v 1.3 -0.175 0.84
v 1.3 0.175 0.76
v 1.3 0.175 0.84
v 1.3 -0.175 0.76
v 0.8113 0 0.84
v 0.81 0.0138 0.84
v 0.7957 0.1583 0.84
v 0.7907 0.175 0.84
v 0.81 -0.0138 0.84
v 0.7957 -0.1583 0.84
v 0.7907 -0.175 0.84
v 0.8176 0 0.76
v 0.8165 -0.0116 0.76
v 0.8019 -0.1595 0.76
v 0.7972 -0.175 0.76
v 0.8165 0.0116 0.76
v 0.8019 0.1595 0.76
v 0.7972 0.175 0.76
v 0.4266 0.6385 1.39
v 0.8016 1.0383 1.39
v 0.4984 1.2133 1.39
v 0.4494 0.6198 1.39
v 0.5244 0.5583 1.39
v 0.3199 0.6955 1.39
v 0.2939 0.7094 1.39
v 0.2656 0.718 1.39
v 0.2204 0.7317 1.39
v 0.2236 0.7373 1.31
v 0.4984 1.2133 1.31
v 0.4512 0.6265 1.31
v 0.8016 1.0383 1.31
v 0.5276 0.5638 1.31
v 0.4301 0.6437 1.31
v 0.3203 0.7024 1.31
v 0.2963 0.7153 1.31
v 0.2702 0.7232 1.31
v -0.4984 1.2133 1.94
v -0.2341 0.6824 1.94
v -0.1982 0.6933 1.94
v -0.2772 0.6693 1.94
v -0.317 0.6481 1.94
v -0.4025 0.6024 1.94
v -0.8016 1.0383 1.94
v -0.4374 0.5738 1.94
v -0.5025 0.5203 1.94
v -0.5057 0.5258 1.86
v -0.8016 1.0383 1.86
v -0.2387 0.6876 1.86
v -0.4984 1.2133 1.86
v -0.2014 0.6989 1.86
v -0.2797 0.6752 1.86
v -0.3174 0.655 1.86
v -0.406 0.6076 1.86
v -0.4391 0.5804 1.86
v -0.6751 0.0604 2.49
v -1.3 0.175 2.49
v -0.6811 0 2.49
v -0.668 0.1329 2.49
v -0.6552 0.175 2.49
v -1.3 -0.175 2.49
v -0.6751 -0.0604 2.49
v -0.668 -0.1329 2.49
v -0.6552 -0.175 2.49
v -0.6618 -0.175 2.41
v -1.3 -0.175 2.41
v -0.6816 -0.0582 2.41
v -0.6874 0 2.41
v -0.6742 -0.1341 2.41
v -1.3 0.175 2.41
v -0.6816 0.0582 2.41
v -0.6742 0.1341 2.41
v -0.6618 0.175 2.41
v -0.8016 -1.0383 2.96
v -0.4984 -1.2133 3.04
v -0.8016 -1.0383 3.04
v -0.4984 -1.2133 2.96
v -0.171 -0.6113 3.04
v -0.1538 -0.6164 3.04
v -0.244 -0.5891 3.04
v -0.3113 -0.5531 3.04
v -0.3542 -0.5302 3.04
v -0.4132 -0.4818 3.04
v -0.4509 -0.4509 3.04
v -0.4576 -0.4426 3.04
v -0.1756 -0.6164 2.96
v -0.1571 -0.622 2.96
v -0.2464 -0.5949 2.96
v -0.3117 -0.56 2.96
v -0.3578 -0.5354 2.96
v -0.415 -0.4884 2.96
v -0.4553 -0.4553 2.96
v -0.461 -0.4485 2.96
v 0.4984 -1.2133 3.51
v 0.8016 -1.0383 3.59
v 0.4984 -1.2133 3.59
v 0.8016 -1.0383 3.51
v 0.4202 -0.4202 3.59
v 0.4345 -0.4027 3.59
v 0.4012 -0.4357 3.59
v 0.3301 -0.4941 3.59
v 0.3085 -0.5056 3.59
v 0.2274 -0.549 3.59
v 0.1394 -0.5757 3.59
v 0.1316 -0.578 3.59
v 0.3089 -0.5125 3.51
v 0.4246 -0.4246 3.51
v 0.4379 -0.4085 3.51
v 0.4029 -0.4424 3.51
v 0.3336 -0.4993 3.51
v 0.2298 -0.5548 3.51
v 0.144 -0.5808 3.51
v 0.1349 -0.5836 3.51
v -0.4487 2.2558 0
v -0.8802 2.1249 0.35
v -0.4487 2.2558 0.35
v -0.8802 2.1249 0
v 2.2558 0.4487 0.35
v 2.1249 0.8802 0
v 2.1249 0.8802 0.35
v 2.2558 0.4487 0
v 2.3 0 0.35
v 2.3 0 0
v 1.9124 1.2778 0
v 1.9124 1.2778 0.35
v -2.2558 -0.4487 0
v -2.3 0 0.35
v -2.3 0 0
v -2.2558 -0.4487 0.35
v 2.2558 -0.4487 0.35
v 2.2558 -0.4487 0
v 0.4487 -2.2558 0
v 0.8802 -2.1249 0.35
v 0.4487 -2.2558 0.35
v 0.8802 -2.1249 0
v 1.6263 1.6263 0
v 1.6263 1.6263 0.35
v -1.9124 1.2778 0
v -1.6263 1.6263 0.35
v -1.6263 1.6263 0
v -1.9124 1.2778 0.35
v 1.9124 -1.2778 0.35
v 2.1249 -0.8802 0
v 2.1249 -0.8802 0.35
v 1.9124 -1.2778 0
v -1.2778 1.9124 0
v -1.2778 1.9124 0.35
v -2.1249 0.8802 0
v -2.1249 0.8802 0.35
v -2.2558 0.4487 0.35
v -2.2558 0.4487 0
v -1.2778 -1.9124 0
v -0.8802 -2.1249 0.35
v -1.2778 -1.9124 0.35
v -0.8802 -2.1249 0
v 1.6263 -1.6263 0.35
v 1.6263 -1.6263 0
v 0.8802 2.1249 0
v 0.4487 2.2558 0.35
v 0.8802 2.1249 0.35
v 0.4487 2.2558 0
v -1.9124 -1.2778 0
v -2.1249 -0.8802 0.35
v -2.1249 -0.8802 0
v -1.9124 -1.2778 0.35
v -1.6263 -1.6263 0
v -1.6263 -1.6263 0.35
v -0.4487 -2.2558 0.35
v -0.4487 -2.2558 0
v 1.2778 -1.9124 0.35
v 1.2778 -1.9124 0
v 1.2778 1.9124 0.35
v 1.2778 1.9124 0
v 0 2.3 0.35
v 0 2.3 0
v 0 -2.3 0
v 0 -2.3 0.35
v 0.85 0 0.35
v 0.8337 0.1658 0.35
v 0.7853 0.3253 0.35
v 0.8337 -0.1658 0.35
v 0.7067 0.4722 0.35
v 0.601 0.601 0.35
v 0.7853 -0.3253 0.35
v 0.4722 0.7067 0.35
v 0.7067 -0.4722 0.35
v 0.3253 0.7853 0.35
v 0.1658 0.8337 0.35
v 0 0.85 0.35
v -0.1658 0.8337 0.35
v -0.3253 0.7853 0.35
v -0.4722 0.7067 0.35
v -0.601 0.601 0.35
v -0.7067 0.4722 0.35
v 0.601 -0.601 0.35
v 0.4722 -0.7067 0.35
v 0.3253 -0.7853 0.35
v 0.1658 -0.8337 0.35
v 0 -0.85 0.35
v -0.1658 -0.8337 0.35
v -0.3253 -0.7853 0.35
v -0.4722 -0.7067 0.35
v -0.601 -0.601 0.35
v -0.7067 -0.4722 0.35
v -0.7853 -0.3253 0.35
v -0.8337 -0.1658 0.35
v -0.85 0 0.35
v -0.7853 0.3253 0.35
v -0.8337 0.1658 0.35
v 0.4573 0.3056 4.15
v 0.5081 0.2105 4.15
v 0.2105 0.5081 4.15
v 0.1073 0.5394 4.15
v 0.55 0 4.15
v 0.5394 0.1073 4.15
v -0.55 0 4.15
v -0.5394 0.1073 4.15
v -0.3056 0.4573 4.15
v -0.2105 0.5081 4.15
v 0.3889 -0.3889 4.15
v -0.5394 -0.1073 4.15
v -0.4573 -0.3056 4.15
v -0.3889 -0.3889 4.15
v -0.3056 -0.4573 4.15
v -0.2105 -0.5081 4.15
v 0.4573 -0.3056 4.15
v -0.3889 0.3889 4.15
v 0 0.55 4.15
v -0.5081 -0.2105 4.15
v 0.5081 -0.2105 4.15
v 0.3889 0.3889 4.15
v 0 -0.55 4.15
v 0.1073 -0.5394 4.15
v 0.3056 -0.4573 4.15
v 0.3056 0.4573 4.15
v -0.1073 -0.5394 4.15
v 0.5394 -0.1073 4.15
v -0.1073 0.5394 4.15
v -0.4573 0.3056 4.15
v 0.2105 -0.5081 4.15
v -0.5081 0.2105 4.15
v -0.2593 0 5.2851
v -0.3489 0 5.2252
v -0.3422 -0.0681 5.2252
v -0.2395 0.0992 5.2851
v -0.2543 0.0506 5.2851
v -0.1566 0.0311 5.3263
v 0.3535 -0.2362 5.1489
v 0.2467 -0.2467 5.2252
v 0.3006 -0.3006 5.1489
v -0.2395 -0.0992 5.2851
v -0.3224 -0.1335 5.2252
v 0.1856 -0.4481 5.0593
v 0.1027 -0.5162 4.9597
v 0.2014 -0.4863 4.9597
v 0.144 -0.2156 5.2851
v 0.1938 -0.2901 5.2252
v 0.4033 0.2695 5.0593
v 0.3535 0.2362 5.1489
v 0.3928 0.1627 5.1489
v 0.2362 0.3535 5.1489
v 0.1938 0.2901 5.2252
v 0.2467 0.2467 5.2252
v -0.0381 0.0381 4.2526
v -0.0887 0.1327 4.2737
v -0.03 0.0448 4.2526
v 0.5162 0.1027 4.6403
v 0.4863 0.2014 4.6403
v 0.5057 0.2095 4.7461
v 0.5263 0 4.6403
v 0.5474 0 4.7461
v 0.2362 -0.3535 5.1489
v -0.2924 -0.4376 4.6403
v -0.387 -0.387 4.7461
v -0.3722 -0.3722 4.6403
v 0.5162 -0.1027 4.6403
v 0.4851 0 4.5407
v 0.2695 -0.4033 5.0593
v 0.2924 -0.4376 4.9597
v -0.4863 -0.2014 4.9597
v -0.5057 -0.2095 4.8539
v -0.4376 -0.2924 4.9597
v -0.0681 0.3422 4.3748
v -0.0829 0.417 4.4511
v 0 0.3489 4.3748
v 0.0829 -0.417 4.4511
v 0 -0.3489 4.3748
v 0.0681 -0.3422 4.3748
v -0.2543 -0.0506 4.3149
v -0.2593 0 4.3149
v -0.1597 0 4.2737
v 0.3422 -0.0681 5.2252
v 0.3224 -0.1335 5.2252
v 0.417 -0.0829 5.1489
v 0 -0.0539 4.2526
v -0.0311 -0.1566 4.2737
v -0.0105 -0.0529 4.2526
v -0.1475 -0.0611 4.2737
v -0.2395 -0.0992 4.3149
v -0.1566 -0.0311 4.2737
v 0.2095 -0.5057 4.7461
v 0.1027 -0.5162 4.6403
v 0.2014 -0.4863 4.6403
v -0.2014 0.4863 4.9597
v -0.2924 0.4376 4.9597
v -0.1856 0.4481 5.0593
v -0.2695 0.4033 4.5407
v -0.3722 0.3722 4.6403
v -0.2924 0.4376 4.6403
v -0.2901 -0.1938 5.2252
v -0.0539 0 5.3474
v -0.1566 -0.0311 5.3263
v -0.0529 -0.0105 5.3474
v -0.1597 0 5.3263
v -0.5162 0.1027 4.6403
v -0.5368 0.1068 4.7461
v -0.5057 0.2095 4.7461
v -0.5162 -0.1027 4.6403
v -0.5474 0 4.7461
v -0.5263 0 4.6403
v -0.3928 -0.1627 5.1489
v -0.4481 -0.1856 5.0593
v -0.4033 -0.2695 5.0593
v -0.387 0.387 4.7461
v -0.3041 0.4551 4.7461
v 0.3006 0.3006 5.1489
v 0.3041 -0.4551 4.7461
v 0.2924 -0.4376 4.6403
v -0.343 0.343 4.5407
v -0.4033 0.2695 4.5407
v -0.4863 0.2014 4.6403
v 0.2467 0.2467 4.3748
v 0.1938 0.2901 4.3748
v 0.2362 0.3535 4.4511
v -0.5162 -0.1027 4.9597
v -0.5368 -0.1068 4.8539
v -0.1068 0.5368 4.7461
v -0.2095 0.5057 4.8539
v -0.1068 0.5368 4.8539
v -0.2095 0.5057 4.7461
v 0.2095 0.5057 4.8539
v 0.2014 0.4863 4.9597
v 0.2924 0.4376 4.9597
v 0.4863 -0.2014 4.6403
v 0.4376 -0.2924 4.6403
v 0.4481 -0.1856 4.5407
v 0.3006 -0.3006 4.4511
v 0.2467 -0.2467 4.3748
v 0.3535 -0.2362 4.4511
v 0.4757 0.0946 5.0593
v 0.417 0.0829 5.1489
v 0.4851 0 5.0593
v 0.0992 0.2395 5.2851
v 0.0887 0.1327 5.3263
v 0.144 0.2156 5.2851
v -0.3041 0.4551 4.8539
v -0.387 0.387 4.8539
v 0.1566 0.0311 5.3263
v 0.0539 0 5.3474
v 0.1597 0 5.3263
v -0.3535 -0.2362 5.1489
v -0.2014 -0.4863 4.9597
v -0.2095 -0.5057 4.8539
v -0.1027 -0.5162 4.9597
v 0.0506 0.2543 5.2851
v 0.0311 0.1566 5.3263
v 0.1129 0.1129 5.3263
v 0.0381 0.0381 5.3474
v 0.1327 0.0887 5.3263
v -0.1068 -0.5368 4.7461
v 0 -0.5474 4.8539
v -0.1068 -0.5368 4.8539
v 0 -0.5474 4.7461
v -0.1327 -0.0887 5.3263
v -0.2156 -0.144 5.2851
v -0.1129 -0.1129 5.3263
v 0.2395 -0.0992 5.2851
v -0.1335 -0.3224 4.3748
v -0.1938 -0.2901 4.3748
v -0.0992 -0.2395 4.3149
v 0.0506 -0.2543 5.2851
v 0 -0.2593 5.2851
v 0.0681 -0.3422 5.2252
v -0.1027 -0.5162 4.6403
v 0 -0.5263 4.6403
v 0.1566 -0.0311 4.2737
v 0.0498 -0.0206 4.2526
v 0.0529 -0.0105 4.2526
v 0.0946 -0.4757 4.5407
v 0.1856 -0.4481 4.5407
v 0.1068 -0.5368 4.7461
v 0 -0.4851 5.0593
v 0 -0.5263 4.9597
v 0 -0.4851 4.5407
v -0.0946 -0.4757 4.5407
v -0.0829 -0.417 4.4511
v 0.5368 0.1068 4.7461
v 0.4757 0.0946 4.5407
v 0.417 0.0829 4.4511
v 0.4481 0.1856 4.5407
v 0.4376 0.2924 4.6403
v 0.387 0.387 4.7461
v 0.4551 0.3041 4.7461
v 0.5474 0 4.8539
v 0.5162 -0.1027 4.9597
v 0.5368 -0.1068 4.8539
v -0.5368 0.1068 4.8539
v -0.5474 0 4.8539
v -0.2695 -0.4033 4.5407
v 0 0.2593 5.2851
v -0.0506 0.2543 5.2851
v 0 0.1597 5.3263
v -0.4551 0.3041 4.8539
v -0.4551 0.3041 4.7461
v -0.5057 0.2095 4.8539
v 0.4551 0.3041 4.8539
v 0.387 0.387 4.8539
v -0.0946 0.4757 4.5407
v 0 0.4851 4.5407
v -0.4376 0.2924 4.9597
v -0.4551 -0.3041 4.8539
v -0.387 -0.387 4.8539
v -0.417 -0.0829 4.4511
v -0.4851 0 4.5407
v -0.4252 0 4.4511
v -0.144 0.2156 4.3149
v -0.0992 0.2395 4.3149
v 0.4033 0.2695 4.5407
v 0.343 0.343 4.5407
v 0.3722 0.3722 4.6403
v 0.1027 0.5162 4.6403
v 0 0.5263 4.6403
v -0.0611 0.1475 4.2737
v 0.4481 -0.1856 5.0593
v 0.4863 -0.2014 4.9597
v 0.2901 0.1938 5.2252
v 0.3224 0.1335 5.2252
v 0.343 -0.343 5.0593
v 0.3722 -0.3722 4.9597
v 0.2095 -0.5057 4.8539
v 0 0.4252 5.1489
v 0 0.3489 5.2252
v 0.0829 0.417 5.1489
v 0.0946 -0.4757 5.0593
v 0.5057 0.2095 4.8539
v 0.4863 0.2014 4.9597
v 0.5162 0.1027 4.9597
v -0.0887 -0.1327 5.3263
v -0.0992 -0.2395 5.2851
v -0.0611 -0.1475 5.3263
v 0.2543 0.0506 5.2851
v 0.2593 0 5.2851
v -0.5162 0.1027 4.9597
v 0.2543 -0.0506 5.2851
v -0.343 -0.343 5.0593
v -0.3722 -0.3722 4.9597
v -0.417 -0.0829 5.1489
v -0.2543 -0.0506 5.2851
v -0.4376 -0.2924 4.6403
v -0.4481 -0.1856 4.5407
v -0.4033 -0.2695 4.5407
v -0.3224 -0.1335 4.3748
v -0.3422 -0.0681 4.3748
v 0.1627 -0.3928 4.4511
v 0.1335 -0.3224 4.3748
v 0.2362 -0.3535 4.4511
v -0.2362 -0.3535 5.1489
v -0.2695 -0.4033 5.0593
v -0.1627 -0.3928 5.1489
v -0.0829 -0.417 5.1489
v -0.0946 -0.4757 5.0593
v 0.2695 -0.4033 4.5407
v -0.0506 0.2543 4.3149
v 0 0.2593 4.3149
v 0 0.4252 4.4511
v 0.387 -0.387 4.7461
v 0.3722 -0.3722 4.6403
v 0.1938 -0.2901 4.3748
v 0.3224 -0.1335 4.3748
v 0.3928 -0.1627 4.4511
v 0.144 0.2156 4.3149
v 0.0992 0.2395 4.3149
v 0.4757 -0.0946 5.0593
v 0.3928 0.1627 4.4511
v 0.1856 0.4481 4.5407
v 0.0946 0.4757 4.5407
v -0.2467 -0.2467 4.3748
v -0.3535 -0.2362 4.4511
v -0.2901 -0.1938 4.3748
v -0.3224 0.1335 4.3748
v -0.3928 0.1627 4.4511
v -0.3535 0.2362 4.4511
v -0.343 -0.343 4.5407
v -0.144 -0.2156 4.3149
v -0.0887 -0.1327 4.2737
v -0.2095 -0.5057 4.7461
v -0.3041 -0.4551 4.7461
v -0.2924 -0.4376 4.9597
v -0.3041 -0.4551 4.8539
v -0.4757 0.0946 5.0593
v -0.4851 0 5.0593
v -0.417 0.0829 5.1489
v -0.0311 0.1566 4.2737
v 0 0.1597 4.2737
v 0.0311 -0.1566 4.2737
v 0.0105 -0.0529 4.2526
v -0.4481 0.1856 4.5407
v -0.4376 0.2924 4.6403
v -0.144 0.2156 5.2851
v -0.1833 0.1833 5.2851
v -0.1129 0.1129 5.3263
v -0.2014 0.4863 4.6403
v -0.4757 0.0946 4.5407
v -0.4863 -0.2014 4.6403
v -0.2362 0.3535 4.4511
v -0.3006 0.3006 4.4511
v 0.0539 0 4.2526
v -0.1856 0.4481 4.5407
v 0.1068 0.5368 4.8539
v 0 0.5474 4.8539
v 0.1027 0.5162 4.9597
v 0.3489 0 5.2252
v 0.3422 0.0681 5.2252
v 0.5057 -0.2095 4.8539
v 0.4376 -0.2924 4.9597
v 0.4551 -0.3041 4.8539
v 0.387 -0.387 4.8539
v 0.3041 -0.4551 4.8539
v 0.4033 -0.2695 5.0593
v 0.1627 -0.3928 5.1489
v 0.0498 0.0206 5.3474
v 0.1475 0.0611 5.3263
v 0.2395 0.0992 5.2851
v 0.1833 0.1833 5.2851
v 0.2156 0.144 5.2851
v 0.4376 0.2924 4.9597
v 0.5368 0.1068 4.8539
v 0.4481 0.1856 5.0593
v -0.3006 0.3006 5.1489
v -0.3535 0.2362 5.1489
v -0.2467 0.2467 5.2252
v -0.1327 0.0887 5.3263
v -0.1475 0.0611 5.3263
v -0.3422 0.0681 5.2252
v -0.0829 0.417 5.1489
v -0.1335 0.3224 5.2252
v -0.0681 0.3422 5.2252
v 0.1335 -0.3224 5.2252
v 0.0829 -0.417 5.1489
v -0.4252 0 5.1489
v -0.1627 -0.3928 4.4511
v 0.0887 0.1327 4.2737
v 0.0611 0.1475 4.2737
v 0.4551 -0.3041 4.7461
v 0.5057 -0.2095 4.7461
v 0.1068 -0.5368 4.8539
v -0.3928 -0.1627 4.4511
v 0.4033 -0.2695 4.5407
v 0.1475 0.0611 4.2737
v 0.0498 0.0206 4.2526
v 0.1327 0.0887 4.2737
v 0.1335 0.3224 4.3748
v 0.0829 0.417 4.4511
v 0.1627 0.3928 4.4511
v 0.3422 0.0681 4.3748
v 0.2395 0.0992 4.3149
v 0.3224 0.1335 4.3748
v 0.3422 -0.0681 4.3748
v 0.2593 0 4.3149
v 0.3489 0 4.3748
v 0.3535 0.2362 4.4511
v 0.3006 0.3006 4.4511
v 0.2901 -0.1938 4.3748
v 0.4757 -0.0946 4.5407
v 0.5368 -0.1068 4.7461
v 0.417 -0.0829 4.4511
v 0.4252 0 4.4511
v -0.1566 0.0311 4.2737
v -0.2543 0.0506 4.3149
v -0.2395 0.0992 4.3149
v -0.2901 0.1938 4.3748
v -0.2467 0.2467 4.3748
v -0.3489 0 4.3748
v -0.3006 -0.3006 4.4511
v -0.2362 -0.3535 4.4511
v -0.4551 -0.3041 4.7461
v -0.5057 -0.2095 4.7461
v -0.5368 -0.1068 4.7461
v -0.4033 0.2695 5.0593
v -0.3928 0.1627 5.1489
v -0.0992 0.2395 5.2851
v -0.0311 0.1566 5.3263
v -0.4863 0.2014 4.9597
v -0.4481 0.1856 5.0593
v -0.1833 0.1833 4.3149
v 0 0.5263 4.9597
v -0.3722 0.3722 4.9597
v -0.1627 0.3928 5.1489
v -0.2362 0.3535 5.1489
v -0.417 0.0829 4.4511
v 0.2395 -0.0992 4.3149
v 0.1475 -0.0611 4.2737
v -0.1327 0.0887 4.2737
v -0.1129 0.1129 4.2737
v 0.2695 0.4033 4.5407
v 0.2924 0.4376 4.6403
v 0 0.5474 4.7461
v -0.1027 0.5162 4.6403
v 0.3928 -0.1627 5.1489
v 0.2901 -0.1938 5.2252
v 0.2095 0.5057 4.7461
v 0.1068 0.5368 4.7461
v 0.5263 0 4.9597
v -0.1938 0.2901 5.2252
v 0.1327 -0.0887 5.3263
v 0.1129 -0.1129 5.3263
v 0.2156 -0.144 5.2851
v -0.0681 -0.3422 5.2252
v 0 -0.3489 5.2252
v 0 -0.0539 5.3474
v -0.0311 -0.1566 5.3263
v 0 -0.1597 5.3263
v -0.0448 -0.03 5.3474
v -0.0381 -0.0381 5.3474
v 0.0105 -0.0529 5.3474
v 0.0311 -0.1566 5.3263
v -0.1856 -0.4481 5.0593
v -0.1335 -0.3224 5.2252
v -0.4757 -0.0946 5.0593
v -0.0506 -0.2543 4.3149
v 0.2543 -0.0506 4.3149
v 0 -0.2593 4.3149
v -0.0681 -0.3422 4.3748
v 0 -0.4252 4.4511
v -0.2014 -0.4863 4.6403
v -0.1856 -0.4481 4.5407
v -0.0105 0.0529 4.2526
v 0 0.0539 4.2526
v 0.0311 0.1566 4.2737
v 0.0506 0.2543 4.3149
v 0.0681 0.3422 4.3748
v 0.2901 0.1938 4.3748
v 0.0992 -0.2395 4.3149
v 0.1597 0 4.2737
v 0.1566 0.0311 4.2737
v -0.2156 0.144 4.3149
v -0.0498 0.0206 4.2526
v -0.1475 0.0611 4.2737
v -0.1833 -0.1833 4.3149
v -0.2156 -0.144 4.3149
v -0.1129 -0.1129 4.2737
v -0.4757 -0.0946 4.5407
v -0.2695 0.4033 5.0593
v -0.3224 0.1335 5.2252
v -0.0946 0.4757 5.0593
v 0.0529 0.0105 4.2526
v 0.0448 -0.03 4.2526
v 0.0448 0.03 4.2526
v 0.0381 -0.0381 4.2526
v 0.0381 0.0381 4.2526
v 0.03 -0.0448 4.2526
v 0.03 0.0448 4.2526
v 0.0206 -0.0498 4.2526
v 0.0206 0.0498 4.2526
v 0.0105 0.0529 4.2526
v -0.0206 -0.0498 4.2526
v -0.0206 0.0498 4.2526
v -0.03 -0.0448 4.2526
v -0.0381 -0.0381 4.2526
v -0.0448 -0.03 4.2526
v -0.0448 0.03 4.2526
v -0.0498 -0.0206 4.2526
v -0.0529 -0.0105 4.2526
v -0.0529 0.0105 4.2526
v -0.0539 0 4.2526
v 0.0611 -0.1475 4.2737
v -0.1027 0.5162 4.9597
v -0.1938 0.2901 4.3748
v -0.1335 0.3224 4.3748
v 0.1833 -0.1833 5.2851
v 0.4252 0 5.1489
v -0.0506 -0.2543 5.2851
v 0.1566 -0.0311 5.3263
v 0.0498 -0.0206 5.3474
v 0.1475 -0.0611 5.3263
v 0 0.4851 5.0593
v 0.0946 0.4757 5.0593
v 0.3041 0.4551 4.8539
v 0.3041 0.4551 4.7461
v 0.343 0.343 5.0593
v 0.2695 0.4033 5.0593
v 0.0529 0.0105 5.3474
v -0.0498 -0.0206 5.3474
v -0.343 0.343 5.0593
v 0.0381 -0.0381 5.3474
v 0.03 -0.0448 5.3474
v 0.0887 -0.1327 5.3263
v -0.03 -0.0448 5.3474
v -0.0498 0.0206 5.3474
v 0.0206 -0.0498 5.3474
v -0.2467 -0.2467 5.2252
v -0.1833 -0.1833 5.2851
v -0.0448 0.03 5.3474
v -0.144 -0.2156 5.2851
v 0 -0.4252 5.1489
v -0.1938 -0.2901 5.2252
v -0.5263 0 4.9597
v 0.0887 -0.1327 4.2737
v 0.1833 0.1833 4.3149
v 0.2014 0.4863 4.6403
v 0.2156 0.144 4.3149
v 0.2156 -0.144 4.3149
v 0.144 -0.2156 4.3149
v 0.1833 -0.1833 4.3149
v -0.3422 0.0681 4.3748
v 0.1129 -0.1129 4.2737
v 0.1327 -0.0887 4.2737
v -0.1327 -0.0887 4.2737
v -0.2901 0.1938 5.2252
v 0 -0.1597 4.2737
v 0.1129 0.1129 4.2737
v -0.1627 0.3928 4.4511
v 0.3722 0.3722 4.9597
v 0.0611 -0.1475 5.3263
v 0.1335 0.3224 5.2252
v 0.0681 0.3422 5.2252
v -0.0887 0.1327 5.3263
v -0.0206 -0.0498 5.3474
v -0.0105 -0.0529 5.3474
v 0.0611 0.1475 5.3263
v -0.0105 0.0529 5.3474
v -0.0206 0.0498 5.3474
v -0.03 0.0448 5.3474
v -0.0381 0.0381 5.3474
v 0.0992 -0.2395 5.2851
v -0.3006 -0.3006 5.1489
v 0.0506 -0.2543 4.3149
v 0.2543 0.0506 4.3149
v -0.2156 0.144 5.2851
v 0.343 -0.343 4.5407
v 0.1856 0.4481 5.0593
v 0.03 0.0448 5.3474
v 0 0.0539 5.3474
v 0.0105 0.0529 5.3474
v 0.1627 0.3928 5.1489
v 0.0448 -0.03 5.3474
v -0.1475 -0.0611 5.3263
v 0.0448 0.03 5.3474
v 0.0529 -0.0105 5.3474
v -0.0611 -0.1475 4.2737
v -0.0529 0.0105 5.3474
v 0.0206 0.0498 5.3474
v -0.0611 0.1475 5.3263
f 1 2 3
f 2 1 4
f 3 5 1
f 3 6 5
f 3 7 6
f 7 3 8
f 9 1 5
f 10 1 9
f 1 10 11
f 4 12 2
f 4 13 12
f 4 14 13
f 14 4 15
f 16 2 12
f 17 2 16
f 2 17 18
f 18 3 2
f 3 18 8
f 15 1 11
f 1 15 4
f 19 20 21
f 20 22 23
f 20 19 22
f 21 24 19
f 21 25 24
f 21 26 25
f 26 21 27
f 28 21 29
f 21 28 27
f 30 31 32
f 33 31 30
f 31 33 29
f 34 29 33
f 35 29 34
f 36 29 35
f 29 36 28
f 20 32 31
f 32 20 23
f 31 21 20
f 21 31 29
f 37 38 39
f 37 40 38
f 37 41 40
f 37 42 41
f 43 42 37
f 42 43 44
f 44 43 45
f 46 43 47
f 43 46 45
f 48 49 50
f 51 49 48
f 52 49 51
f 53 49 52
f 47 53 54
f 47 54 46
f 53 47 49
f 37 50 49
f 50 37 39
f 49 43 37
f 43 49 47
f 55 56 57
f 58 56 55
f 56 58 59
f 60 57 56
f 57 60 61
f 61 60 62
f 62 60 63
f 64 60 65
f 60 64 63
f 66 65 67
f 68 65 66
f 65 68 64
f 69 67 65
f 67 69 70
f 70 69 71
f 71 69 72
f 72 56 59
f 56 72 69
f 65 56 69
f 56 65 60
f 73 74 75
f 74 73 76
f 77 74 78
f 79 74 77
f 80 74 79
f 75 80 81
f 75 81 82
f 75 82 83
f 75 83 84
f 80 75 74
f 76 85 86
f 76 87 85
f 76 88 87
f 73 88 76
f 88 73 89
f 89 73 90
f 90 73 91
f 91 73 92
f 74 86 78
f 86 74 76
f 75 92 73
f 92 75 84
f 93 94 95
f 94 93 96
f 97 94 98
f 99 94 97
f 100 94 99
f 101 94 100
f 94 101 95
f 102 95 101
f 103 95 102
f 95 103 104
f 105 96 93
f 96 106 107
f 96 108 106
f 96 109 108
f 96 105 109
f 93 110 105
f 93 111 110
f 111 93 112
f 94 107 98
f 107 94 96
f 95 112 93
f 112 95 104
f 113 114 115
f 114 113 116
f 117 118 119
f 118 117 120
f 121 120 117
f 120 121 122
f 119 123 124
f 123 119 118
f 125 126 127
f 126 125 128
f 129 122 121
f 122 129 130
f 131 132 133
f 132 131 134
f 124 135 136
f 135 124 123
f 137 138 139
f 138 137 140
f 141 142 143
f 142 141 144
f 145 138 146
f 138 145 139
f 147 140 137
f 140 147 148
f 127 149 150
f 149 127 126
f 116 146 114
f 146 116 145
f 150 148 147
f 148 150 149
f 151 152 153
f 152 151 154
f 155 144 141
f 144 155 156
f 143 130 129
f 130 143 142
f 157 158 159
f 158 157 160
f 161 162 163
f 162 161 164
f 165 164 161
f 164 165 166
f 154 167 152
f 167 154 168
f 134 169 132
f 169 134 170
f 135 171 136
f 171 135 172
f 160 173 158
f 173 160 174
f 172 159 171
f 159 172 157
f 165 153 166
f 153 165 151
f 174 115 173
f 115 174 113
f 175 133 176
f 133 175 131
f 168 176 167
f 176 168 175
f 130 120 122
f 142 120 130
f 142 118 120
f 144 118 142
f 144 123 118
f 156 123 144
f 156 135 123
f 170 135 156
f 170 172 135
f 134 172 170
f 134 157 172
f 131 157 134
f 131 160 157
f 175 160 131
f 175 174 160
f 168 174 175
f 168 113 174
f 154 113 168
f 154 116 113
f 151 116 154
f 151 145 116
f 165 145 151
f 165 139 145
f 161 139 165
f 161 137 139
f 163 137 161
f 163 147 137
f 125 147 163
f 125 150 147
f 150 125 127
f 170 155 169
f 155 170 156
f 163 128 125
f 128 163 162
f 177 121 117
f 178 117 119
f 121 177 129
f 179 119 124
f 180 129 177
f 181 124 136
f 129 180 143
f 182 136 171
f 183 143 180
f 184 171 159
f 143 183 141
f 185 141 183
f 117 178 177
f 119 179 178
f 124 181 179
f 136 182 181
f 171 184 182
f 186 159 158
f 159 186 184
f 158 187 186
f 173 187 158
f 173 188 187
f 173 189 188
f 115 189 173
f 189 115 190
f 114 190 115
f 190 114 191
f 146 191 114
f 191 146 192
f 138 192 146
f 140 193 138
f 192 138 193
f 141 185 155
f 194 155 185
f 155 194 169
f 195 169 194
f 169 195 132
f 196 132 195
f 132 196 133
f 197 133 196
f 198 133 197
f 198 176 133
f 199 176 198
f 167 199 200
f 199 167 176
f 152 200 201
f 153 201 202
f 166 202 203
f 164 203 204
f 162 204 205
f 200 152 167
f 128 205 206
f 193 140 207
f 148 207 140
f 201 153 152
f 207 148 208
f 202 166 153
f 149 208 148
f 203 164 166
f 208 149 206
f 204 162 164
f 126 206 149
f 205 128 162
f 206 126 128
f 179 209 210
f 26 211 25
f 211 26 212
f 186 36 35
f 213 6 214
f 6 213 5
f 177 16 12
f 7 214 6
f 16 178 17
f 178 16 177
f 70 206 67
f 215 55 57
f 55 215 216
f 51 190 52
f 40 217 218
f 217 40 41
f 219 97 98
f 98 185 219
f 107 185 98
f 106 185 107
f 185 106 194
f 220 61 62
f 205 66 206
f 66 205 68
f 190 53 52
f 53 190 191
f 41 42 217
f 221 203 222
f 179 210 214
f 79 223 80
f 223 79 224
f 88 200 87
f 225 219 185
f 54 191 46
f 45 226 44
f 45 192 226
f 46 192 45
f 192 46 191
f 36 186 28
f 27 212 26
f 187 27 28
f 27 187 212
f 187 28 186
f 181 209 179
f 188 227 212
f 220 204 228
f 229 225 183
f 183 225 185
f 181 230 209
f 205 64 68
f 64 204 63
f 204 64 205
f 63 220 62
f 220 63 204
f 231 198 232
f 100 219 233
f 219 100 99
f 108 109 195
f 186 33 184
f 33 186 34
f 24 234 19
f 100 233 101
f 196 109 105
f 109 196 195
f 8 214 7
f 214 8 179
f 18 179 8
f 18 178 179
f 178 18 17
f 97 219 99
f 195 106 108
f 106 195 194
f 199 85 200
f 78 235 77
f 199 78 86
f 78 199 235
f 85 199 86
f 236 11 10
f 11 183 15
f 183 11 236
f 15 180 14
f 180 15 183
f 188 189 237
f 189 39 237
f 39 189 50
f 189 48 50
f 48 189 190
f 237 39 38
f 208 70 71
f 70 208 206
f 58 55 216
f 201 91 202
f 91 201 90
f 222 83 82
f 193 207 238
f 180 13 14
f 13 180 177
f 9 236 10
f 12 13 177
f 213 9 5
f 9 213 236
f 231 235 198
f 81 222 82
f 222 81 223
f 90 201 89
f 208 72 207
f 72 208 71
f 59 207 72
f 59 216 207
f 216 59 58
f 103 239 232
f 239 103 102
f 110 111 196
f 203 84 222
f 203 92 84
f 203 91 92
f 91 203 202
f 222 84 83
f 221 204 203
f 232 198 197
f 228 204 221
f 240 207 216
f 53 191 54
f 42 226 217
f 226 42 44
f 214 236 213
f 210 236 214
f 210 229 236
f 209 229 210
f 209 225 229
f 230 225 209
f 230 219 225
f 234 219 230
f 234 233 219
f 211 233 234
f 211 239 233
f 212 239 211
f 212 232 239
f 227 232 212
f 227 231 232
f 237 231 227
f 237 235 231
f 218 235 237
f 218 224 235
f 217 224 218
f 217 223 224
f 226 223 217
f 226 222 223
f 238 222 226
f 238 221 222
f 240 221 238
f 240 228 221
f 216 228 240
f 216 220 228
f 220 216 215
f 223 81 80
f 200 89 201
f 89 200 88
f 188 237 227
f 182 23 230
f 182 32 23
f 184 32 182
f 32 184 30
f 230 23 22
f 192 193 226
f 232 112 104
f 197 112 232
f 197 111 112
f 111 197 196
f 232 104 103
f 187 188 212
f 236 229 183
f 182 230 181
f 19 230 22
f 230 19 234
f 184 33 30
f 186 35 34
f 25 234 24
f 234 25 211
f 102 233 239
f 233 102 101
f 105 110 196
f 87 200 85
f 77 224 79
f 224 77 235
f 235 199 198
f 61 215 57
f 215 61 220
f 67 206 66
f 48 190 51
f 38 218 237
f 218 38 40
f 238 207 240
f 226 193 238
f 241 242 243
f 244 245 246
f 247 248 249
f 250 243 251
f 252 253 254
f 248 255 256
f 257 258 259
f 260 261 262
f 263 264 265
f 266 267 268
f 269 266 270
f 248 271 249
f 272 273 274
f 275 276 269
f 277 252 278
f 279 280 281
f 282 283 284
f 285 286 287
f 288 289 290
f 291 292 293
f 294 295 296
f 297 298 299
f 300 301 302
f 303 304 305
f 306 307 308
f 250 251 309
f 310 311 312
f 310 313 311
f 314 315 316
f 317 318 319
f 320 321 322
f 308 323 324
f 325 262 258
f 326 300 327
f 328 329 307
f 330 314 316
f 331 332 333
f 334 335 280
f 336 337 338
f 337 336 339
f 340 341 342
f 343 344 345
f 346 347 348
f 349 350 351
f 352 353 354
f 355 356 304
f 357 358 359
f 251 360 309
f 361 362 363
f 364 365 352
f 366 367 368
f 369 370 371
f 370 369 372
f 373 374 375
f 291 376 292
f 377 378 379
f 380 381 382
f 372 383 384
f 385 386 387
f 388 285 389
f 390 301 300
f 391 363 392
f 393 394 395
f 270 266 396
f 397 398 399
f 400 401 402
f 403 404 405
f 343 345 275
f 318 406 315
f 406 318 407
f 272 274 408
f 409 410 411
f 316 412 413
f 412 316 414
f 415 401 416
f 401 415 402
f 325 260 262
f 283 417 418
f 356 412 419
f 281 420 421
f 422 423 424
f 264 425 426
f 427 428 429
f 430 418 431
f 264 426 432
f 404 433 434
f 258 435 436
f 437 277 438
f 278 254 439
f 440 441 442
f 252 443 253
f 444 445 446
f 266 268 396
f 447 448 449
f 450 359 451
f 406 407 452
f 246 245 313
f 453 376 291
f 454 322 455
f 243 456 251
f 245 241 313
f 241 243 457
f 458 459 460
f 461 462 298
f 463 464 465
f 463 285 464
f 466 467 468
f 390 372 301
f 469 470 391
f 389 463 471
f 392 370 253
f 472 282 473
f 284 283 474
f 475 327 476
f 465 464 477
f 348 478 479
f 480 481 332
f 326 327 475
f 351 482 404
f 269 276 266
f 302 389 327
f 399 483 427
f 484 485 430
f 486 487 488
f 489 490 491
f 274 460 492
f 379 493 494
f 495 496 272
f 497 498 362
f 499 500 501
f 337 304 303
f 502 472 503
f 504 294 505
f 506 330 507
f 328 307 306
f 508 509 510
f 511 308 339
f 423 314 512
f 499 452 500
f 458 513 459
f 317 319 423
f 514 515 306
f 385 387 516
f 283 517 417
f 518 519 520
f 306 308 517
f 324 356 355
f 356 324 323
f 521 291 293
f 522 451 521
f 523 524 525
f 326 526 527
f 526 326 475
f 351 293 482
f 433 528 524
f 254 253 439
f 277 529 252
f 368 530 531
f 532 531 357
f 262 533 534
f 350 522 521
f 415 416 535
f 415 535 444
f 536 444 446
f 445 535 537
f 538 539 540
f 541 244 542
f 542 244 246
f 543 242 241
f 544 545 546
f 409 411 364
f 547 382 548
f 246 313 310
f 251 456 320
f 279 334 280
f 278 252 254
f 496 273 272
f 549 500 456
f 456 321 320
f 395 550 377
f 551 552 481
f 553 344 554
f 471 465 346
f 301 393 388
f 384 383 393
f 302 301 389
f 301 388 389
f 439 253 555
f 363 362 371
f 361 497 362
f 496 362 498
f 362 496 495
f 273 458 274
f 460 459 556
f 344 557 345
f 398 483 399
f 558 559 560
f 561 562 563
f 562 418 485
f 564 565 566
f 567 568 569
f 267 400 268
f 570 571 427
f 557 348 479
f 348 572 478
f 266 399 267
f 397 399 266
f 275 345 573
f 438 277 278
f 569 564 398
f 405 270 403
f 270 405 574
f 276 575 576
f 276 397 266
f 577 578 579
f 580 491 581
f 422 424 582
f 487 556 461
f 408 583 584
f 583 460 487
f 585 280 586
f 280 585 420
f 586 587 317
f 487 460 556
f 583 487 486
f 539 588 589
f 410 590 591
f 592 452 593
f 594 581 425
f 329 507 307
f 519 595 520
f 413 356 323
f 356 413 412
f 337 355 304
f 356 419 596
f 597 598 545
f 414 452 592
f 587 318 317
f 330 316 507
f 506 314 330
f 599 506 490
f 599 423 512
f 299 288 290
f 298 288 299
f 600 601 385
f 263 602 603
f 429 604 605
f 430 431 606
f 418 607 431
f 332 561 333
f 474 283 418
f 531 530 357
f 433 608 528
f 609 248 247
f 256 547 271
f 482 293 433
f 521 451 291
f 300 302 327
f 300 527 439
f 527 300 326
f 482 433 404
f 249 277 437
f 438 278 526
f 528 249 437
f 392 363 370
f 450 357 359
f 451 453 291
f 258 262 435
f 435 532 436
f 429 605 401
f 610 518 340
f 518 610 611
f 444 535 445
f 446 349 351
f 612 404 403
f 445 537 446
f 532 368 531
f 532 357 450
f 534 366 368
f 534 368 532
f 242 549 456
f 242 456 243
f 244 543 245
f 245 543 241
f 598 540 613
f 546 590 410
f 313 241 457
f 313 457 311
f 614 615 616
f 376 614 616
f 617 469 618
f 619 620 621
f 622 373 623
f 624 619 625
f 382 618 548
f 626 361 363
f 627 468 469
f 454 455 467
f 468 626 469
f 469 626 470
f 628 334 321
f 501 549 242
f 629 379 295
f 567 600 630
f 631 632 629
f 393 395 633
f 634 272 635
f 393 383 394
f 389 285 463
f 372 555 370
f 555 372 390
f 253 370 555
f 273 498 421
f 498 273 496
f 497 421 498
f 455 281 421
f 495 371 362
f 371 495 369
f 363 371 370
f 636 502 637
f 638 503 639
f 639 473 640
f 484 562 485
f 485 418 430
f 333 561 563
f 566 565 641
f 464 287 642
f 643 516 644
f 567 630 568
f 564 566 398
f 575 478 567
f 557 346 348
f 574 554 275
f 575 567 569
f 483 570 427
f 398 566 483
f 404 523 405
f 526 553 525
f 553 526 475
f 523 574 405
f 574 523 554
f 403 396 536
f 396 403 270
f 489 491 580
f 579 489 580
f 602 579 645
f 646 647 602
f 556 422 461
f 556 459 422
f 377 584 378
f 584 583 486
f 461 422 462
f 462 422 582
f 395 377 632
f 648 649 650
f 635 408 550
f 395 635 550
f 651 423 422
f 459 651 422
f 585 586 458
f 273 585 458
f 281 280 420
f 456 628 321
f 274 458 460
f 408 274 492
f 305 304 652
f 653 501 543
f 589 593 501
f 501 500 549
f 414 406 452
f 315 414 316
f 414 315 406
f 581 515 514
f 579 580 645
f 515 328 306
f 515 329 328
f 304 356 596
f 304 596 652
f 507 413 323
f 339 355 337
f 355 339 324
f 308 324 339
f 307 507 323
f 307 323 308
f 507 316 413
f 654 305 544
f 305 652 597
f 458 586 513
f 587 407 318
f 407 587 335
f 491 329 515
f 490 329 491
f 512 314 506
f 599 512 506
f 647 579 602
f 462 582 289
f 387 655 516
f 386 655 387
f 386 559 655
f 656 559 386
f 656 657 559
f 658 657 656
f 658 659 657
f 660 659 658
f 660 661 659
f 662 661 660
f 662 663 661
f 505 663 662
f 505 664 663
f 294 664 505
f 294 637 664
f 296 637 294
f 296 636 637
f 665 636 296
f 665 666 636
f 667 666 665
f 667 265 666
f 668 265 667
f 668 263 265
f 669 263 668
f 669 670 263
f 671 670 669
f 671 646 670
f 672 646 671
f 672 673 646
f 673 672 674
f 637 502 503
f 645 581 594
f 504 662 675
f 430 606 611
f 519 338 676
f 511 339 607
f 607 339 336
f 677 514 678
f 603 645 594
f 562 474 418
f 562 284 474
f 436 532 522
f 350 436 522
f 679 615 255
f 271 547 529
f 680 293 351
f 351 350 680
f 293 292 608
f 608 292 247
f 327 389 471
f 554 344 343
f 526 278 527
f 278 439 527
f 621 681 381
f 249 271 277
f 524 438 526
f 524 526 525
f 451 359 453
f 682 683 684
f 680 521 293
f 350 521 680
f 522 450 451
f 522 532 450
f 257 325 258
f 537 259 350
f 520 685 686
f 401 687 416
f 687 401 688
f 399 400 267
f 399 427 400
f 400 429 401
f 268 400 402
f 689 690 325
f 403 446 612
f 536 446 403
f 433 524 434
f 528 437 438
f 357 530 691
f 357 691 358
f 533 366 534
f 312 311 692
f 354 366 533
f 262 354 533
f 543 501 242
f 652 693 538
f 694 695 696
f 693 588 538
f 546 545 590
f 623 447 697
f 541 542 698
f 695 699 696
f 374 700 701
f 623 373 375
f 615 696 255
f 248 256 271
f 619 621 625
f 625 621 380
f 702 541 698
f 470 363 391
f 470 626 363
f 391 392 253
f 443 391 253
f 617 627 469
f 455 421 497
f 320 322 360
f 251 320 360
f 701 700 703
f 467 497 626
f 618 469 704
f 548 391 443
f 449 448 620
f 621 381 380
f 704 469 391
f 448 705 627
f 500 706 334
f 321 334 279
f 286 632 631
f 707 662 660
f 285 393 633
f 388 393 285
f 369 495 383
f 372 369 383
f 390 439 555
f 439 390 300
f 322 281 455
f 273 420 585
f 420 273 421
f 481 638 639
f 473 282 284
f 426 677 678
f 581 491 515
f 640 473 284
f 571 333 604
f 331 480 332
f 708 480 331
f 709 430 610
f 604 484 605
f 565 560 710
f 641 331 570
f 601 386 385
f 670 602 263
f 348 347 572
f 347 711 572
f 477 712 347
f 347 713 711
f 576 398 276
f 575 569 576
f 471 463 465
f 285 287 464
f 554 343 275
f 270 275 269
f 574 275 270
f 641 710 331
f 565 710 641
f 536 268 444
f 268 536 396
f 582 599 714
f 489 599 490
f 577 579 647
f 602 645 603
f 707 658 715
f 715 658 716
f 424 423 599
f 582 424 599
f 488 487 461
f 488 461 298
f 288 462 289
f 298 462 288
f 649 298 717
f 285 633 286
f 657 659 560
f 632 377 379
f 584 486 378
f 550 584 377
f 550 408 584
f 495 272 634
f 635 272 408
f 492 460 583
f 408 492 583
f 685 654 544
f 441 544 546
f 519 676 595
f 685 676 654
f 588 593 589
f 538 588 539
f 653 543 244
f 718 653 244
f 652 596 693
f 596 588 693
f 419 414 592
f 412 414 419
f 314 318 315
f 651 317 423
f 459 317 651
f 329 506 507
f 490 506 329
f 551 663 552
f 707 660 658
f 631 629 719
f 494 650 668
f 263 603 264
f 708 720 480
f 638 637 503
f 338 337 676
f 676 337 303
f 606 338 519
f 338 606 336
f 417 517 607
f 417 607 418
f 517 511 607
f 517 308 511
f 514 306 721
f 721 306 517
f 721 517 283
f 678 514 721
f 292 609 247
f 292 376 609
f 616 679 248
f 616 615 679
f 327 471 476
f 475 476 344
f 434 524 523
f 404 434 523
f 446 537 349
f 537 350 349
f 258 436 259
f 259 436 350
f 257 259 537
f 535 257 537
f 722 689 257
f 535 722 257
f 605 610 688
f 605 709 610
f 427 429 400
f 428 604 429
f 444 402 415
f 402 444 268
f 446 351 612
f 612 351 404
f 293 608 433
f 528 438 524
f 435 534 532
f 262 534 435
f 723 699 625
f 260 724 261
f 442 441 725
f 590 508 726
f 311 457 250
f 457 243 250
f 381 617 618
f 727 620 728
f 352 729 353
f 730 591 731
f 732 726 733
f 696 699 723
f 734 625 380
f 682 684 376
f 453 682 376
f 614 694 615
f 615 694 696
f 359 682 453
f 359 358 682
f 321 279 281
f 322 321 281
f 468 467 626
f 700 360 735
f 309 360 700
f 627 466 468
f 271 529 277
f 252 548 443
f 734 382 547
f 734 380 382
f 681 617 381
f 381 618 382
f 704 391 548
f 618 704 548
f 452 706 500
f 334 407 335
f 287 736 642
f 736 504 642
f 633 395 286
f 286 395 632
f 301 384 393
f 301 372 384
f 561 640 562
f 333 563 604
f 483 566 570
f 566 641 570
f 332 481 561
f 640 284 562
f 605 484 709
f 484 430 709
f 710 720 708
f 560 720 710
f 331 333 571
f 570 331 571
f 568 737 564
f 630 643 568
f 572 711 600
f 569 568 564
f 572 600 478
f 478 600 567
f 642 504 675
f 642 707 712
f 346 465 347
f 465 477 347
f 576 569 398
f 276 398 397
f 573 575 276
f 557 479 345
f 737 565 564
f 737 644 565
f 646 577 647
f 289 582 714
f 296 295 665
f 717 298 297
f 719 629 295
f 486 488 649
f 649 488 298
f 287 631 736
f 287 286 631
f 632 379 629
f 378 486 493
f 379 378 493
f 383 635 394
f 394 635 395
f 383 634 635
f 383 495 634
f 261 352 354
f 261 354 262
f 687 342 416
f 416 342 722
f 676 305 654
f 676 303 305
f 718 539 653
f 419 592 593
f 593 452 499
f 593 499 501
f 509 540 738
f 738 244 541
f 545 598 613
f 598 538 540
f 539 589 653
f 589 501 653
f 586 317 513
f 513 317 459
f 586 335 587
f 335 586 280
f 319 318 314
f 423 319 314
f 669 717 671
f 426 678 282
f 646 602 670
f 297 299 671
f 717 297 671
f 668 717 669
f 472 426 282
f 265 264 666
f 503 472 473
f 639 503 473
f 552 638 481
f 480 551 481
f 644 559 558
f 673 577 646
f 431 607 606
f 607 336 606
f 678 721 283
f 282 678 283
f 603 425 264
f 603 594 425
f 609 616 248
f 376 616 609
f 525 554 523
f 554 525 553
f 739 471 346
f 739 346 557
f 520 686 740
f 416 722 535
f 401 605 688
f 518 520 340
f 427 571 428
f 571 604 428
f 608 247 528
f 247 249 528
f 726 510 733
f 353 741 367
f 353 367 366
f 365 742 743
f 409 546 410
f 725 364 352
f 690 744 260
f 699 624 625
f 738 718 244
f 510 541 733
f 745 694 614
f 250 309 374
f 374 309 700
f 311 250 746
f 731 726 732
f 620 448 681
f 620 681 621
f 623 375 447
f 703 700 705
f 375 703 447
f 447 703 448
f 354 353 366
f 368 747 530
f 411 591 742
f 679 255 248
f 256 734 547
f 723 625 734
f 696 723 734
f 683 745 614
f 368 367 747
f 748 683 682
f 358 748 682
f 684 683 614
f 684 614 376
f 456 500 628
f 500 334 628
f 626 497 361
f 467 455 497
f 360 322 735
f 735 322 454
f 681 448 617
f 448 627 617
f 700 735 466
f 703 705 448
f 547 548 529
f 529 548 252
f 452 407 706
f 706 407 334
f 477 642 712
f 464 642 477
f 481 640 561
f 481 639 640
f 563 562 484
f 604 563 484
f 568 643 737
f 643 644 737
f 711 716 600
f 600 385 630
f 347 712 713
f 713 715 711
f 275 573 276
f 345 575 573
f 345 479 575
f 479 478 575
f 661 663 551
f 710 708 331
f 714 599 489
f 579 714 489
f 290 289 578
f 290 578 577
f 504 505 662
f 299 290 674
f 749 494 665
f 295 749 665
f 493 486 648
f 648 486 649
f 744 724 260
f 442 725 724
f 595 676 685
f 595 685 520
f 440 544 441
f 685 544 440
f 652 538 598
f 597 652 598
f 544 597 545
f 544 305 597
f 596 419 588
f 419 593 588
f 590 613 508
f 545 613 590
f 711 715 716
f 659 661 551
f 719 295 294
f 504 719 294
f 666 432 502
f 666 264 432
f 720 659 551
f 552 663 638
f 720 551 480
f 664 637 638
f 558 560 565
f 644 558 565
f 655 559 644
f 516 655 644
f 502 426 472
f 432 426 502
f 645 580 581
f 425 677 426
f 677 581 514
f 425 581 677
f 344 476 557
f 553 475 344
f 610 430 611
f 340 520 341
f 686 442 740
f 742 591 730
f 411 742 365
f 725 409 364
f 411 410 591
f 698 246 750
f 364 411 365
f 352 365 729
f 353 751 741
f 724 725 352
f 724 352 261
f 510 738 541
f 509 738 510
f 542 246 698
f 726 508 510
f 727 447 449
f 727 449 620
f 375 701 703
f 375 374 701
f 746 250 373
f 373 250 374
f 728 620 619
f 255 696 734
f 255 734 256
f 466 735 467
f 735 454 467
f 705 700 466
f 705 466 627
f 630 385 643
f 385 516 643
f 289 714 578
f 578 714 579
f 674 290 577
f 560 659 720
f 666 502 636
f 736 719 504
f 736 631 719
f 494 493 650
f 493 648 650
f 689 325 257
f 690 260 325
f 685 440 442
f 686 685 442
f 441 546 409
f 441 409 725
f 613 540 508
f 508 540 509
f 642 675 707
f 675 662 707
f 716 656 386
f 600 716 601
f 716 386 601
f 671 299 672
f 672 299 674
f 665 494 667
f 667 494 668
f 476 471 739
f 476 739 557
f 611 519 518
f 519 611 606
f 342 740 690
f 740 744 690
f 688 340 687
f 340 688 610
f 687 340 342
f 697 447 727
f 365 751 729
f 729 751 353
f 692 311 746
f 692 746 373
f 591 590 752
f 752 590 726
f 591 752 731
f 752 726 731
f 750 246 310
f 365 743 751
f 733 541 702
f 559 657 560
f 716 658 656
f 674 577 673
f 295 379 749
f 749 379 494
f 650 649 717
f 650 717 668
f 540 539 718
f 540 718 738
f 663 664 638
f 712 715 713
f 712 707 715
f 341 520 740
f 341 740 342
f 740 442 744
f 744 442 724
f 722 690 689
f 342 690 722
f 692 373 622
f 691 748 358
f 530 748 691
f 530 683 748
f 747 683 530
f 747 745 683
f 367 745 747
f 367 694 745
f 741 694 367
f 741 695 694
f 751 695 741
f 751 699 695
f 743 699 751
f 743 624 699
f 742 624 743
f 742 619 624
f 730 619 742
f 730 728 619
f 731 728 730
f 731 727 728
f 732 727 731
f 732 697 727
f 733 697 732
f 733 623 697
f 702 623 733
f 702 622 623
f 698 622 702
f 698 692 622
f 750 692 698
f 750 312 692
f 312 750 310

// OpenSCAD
// 读写3 Unit3 · 螺旋塔
$fn = 32;

color("DarkGreen") cylinder(h = 0.35, r = 2.3);
color("SeaGreen") translate([0, 0, 0.35]) cylinder(h = 3.8, r1 = 0.85, r2 = 0.55);

for (i = [0:5])
  color("MediumSpringGreen")
    translate([0, 0, 0.8 + i * 0.55])
      rotate([0, 0, i * 60])
        translate([0.75, 0, 0])
          cube([1.1, 0.35, 0.08], center = true);

color("Turquoise") translate([0, 0, 4.8]) sphere(r = 0.55);
